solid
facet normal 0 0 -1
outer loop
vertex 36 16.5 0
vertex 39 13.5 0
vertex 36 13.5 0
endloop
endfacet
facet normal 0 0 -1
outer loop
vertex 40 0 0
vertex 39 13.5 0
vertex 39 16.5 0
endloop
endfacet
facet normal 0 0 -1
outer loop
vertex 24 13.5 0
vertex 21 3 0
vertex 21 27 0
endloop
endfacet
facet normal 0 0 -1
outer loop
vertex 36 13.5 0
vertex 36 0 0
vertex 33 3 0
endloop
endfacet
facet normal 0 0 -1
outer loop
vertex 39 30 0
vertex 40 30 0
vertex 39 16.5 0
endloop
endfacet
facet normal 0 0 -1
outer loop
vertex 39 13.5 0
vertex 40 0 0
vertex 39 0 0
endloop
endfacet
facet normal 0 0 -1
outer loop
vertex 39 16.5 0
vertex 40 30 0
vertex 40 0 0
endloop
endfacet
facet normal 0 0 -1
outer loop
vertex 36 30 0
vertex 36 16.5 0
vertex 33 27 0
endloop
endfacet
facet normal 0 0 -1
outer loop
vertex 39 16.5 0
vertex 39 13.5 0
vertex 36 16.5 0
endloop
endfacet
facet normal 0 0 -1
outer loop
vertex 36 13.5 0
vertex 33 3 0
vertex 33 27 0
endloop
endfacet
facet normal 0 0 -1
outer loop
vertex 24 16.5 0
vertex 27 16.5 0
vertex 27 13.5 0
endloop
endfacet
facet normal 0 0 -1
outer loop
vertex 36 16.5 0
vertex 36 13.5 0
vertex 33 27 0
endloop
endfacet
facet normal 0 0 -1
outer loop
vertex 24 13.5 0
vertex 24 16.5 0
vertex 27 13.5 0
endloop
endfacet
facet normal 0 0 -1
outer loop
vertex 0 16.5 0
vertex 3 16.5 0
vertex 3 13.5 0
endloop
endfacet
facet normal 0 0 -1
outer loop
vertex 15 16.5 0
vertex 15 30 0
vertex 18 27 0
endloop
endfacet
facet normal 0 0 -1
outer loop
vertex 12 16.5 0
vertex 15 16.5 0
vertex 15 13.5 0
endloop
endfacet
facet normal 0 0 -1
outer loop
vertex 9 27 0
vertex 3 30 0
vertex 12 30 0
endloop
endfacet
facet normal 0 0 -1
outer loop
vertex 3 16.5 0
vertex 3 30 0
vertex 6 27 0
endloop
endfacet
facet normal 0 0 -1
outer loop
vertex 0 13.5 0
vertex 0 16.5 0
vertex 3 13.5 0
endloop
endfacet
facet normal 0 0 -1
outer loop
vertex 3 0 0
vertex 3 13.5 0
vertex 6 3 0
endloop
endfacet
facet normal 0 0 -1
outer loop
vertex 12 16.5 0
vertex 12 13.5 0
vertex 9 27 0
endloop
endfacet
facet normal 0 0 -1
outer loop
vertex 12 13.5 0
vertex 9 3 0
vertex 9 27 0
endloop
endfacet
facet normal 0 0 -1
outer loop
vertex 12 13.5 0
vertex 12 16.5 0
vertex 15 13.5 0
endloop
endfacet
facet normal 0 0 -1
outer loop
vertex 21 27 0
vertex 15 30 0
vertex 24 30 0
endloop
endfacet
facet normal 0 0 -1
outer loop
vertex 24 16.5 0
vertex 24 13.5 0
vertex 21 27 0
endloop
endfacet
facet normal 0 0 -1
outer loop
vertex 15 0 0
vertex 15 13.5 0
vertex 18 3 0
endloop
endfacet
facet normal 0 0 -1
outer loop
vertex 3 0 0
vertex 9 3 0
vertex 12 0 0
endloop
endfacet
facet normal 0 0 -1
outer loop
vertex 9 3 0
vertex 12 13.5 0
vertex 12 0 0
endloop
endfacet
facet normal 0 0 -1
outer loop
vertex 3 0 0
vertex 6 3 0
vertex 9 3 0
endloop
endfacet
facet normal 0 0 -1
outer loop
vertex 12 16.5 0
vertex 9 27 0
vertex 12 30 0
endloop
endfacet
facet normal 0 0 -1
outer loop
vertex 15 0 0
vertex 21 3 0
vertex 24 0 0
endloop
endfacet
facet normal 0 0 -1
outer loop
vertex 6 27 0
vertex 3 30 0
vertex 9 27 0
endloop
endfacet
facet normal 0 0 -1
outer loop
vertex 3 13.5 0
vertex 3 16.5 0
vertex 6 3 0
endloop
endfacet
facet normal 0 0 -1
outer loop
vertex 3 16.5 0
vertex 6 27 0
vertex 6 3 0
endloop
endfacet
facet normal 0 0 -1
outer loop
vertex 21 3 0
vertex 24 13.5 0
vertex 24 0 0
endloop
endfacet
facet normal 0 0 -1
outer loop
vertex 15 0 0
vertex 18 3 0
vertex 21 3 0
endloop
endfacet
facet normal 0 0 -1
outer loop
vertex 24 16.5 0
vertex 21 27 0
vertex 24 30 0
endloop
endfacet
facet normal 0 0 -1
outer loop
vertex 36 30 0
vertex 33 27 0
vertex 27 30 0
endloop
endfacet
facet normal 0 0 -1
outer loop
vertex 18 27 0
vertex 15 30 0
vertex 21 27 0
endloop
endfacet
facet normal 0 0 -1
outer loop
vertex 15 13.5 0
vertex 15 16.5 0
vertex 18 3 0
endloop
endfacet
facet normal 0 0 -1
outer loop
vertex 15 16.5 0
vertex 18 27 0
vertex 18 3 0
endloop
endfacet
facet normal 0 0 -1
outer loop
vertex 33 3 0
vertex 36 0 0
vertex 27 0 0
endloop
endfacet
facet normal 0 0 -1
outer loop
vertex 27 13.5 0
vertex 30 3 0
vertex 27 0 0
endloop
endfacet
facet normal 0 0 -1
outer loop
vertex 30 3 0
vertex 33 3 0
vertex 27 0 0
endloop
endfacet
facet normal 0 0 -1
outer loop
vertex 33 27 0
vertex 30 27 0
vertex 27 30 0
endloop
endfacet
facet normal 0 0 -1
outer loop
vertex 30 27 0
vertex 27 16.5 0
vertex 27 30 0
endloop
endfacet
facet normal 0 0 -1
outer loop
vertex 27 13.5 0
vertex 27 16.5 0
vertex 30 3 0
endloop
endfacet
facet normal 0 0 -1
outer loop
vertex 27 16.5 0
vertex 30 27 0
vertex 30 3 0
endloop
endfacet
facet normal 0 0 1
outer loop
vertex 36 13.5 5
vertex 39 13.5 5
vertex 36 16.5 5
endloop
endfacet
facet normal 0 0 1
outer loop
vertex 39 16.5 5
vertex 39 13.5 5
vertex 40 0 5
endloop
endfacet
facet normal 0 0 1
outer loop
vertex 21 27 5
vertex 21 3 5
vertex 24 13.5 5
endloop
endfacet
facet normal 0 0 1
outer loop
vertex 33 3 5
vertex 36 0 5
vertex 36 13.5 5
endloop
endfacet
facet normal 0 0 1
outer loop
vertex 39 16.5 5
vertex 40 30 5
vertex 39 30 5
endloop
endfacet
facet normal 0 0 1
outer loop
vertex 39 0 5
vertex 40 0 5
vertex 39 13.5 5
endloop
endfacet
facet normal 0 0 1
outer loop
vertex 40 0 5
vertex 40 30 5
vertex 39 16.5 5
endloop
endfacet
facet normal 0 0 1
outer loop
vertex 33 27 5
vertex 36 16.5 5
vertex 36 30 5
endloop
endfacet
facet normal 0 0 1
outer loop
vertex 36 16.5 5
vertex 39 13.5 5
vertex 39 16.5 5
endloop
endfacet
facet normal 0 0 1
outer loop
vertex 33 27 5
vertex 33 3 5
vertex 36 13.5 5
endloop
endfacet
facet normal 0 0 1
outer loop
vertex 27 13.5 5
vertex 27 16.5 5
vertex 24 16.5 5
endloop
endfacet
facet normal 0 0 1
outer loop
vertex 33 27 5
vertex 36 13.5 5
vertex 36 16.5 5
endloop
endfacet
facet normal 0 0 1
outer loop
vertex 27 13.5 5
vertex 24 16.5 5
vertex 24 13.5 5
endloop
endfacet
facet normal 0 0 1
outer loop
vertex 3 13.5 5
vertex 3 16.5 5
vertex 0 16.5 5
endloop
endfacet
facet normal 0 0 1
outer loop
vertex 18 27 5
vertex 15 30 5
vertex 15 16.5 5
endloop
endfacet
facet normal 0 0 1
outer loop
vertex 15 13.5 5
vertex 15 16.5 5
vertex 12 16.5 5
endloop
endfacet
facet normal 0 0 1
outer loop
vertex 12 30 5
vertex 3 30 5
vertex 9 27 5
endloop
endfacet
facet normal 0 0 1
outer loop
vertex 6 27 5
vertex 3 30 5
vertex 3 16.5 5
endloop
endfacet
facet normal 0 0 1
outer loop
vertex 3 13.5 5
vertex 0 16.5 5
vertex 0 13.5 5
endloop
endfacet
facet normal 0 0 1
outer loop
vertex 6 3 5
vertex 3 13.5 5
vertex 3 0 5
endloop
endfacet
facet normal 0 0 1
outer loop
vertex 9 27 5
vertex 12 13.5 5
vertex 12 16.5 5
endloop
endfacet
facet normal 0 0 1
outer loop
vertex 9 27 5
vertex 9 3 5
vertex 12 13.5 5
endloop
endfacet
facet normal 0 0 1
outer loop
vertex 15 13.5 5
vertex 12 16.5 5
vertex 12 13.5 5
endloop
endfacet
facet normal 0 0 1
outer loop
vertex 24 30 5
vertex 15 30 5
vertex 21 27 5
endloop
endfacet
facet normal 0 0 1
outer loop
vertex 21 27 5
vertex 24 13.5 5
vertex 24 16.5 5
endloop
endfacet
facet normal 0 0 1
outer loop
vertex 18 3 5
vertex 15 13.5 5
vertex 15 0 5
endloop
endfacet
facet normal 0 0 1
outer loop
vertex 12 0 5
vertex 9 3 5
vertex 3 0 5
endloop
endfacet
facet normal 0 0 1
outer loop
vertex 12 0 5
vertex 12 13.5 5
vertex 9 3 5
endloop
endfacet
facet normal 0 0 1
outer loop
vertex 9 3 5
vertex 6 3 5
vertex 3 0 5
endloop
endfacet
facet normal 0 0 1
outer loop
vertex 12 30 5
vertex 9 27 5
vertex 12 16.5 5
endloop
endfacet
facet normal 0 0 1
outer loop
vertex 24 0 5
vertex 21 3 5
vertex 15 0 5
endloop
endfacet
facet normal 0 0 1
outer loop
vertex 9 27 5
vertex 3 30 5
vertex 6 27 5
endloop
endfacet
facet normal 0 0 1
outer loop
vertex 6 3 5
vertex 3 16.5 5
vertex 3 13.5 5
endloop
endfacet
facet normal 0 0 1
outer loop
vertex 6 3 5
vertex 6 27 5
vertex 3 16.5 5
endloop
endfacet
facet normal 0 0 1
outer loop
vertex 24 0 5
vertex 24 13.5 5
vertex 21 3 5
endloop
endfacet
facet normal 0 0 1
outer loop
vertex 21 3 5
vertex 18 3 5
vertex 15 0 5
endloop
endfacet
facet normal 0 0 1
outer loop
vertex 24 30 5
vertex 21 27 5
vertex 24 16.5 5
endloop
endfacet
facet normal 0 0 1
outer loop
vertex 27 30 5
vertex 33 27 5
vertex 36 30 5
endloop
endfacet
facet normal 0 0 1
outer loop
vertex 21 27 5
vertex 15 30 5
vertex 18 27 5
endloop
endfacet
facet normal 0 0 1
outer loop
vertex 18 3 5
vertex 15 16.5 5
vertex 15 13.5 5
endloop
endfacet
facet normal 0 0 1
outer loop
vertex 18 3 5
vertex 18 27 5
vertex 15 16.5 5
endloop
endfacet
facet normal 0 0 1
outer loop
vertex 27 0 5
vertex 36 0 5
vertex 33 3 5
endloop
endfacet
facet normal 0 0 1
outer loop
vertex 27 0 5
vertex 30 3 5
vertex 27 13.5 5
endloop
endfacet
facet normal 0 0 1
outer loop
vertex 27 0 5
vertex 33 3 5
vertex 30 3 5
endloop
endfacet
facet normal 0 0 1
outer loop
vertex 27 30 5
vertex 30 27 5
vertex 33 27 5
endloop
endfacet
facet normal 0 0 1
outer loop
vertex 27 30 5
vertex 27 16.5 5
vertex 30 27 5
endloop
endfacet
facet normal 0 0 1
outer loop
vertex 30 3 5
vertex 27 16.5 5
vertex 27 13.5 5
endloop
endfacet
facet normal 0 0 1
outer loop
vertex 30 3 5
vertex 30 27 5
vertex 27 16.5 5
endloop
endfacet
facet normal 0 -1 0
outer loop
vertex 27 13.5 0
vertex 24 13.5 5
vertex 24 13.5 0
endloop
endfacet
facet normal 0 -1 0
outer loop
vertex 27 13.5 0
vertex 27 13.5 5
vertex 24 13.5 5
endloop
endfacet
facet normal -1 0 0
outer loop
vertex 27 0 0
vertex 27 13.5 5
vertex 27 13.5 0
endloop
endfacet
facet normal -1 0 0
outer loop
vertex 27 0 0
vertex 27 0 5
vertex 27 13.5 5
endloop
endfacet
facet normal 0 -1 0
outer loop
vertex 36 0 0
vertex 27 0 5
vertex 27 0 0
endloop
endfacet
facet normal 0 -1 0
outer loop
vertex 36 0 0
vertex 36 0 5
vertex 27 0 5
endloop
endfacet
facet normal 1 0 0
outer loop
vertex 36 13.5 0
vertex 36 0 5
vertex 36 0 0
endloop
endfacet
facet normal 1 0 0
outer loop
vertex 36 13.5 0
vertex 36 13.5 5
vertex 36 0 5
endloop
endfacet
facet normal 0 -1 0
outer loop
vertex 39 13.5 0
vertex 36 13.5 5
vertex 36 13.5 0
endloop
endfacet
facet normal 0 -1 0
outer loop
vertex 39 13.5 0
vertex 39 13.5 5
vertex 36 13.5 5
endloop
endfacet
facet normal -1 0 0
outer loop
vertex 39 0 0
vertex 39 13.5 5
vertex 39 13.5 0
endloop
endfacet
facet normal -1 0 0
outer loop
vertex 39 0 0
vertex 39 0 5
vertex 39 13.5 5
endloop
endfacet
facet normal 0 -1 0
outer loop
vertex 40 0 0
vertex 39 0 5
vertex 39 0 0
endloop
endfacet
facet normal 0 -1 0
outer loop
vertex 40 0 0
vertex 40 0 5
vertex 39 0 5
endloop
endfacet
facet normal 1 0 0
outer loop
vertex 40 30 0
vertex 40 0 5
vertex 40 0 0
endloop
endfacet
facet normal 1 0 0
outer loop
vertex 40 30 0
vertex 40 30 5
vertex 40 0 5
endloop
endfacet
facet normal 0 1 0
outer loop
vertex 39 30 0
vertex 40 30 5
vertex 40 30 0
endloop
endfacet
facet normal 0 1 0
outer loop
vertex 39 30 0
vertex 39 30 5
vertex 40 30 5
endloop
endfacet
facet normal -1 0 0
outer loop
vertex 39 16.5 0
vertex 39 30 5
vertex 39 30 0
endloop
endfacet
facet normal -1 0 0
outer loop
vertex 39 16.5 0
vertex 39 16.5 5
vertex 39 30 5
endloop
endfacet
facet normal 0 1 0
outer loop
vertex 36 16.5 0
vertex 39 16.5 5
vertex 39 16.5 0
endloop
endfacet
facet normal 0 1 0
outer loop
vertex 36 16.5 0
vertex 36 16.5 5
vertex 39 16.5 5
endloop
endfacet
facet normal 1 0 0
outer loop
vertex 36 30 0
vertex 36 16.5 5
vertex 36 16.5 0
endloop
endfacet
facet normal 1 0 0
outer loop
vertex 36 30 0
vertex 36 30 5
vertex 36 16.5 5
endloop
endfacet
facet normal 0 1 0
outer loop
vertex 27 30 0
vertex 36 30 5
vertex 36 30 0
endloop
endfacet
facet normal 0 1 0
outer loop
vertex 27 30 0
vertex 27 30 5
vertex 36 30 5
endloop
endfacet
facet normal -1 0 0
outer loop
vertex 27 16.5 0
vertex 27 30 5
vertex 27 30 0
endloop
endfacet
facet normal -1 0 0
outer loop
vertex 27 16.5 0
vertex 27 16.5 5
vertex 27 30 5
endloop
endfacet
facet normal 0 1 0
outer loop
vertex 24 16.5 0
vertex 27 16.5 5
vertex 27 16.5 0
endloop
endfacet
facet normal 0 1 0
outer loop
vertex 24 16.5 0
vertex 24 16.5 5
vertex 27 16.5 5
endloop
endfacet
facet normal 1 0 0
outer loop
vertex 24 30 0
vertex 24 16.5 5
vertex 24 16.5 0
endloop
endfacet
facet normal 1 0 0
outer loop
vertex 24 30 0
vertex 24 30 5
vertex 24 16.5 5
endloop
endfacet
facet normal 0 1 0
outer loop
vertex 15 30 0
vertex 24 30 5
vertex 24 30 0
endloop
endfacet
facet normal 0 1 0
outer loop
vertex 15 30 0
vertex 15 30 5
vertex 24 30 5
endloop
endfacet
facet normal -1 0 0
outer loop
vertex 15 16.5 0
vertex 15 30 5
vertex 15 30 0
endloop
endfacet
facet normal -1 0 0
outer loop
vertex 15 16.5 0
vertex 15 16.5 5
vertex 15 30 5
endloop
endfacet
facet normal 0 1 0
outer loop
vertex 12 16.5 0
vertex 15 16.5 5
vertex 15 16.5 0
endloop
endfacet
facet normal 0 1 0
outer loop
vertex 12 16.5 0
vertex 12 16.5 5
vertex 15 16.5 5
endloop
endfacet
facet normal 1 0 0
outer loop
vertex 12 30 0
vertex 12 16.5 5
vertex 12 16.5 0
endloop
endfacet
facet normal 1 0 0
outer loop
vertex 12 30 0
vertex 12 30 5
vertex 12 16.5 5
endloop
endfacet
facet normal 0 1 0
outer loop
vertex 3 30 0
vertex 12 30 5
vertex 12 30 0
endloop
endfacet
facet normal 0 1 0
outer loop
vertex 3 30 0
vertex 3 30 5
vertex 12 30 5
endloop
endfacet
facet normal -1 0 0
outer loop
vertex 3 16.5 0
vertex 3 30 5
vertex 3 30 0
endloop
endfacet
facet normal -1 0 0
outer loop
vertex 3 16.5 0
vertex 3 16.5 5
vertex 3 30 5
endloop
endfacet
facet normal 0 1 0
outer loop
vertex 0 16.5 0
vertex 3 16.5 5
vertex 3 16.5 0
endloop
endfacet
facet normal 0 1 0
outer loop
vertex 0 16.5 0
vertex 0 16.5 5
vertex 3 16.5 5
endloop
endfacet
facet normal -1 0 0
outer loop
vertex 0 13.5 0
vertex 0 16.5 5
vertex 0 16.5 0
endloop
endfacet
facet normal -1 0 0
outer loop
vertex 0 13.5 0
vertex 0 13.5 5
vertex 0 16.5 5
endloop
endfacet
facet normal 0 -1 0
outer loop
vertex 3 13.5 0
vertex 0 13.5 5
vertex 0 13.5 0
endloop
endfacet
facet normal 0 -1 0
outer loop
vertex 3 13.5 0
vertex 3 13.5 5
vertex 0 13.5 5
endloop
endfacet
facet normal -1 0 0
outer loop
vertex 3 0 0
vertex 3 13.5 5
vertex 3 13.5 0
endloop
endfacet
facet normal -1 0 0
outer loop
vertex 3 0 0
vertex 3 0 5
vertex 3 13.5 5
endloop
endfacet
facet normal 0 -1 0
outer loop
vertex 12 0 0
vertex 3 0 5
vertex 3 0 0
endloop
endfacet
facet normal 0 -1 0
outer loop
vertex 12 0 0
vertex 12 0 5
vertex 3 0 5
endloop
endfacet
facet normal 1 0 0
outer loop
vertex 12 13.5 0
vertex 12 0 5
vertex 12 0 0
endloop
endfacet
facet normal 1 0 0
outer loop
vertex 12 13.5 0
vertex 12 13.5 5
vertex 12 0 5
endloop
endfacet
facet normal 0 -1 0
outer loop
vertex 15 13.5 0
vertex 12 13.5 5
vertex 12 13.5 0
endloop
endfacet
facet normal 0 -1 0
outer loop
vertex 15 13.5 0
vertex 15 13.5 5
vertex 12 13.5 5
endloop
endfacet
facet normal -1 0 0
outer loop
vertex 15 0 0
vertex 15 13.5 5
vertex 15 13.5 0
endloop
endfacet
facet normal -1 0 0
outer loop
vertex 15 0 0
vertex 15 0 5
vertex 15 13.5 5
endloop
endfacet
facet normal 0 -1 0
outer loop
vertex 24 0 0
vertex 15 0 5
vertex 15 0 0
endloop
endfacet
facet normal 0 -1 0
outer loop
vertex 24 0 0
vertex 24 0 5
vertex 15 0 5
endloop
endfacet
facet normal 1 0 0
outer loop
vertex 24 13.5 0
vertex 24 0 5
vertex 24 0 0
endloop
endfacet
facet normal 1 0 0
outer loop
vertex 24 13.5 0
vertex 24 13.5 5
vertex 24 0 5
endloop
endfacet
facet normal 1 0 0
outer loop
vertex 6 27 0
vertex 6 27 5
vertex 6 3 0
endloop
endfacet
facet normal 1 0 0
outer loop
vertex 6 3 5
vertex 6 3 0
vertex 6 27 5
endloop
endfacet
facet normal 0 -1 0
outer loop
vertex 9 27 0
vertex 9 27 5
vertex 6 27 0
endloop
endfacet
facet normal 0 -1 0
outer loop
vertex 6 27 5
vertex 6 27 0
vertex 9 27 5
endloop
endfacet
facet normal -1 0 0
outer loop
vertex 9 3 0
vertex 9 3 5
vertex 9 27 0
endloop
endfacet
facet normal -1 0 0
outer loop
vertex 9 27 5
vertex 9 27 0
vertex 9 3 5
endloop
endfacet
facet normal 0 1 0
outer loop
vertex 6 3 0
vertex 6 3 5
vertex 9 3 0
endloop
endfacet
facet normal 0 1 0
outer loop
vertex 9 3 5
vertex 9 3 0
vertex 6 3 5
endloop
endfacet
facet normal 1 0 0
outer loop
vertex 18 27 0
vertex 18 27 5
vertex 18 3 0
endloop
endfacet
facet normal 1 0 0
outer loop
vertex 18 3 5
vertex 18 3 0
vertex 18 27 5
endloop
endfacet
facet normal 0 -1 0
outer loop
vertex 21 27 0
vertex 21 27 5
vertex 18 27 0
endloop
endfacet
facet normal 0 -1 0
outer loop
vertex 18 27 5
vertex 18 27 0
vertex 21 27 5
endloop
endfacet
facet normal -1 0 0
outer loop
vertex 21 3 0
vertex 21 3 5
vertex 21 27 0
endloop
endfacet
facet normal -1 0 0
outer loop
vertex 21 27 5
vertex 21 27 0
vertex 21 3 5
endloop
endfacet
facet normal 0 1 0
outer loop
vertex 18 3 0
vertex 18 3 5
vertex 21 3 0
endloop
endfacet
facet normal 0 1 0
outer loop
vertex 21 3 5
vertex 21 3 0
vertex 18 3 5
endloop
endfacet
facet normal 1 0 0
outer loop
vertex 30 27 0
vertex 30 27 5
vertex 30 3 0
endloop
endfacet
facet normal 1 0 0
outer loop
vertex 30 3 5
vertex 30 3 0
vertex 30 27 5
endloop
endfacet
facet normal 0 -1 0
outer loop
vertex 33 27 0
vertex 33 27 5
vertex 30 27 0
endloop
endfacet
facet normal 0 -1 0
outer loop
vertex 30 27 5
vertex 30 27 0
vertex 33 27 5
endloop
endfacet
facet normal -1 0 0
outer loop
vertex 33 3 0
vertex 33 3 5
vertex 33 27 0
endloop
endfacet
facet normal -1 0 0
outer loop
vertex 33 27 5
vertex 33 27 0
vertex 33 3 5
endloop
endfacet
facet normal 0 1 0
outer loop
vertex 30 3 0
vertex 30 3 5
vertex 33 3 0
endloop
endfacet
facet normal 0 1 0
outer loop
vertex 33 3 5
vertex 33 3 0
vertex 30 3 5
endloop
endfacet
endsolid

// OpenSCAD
//Living Hinge
//Ari M Diacou
//Metis Industries
//August 2016

//Thanks to Ronaldo Persiano for the inspiration for add_hinge()

///////////////////////////// Parameters /////////////////////////////////////
//The y dimension of the hinge, parallel to the laser cuts
length=30;
//The x dimension of the hinge, transverse to laser cuts
width=40;
//The distance between parallel laser cuts
d=6;
//The distance between 2 collinear laser cuts
hinge_length=3;
//The number of hinges across the length of the hinge
hinges_across_length=1;
//How thick do you want the hinge to be
height=5;
///////////////////////////////// Main() //////////////////////////////////////
//preview[view:north, tilt:top]
linear_extrude(height) hinge(length=length,width=width,d=d,minimum_thinness=.01,hinge_length=hinge_length,hinges_across_length=hinges_across_length);
////Uncomment lines to see samples (all flat for DXF exporting)
//hinge();
//hinge(d=6);
//hinge(length=20, width=39,d=6,hinge_length=2.5,hinges_across_length=2,minimum_thinness=3);
//hinge(length=30, width=20,d=2,hinge_length=2.5,hinges_across_length=2,minimum_thinness=3,center=true);
//hinge(length=20, width=40,d=3,hinge_length=4,hinges_across_length=0,minimum_thinness=1);
//linear_extrude(height=5) hinge(length=20, width=40,d=6,hinge_length=2.5,hinges_across_length=2,minimum_thinness=3);
//add_hinge(width=20,length=length,center=true) square([3*length,length-1],center=true);
//add_hinge(width=20,length=90) translate([5,0]) circle(d=90);
//add_hinge(width=30,length=90,hinges_across_length=3) circle(d=90);
//add_hinge(width=30,length=90,hinges_across_length=3,center=false) circle(d=90);
//add_hinge(width=30,length=90,hinges_across_length=3,minimum_thinness=.1) circle(d=90);

/////////////////////////////// Functions /////////////////////////////////////
module hinge(length=30,width=20,d=3,minimum_thinness=3,hinge_length=3,hinges_across_length=2,center=false){
    //length = the y dimension of the hinge, parallel to the laser cuts
    //width = the x dimension of the hinge, transverse to laser cuts
    //d=the distance between parallel laser cuts
    //What is the minimum distance that two parallel lines can be apart before the laser does something catastrophic? E.g. setting uncontrollable fire to the work piece. This is "minimum_thinness"
    //hinge_length=the distance between 2 colinear laser cuts
    //hinges_across_length=the number of hinges across the length of the hinge
    //center is a boolean value, if true, place the center of the rectangle at the origin, if false, put the bottom left corner at the origin (just like square() and cube())
    ep=.00101;//epsilon, a small number,=1.01 micron, a hack (for OpenSCAD 2015.03) used to make square()'s which look like lines (which OpenSCAD doesn't support). Hopefully, your laser has a function which says something like "ignore cuts less than THRESHOLD apart", set that to anything greater than ep.
    adjust=center?-[width,length]/2:[0,0];//a vector for adjusting the center position
    th=d/2<minimum_thinness?ep:d/2;//If the distance between lines is less than the minimum thickness, just make linear cuts, specifically, set the width=th=thickness of the squares to ep, which is just above 1 micron (for 1=1mm slicers)
    n=floor(width/d);
    m=floor(abs(hinges_across_length)); echo(str("Number of hinges (m)=",m)); //input cleaning, ensures m ϵ {non-negative integers}
    echo(str("Suggested filename: Living Hinge-",length,"x",width,"mm-h=",m,"x",hinge_length,"-th=",th));
    echo(str("The distance between parallel laser cuts (d) is: ",d," mm."));
    //the length of the short lines
    short=(length-m*hinge_length)/(m+1);
    //the length of the long lines
    long=(length-(m+1)*hinge_length)/(m);
    echo(str("There should be n=",n," links in the hinge."));
    translate(adjust) difference(){ 
        square([width,length],center=false);
        if(m==0) 
            //In the special case where |hinges_across_length|<1, the hinge should look like:
            // |  --------------------------------------|
            // |--------------------------------------  |
            // |  --------------------------------------|
            // |--------------------------------------  |
                for(i=[0:n])
                    translate([i*d,(pow(-1,i))*hinge_length]) // (-1)^i,{iϵZ} = {-1,+1,-1,+1,...}
                        square([th,length]);                
        else
            //A hinge with hinges_across_length=2 should look like:
            // |------------  ------------  ------------|
            // |  -----------------  -----------------  |
            // |------------  ------------  ------------|
            // |  -----------------  -----------------  |
            for(i=[0:n]){ //Iterating across x
                translate([i*d*1,0]){ //Do the x translation seperate from the y translations
                    if(i%2==1) //For odd columns
                        for(j=[0:m-1]){
                            translate([0,hinge_length+j*(long+hinge_length)]) 
                                square([th,long]);
                            }
                    if(i%2==0) //For even columns
                        for(j=[0:m]){
                            translate([0,j*(short+hinge_length)]) 
                                square([th,short]);
                        }
                    }
                }
            }
    }
    
module add_hinge(length=30,width=20,d=3,minimum_thinness=3,hinge_length=3,hinges_across_length=2,center=true){
    //add_hinge() modifies another 2D object, by adding a hinge which is centered on the origin (by default, this can be changed to false, so that the bottom left corner of the hinge is at the origin. It uses the same parameters as hinge(). 
    //First, difference() a rectangle the size of the hinge from the child object (makes a hole for the hinge
    //Second, union() a hinge with First (puts the hinge in the hole)
    //Third, intersection() the child object with Second (cuts off any extra hinge that sticks out past the child object)
    intersection(){
        children();
        union(){
            hinge(length=length,width=width,d=d,minimum_thinness=minimum_thinness,hinge_length=hinge_length,hinges_across_length=hinges_across_length,center=center);
            difference(){
                children();
                square([width,length],center=center);
                }
            }
        }
    }    
